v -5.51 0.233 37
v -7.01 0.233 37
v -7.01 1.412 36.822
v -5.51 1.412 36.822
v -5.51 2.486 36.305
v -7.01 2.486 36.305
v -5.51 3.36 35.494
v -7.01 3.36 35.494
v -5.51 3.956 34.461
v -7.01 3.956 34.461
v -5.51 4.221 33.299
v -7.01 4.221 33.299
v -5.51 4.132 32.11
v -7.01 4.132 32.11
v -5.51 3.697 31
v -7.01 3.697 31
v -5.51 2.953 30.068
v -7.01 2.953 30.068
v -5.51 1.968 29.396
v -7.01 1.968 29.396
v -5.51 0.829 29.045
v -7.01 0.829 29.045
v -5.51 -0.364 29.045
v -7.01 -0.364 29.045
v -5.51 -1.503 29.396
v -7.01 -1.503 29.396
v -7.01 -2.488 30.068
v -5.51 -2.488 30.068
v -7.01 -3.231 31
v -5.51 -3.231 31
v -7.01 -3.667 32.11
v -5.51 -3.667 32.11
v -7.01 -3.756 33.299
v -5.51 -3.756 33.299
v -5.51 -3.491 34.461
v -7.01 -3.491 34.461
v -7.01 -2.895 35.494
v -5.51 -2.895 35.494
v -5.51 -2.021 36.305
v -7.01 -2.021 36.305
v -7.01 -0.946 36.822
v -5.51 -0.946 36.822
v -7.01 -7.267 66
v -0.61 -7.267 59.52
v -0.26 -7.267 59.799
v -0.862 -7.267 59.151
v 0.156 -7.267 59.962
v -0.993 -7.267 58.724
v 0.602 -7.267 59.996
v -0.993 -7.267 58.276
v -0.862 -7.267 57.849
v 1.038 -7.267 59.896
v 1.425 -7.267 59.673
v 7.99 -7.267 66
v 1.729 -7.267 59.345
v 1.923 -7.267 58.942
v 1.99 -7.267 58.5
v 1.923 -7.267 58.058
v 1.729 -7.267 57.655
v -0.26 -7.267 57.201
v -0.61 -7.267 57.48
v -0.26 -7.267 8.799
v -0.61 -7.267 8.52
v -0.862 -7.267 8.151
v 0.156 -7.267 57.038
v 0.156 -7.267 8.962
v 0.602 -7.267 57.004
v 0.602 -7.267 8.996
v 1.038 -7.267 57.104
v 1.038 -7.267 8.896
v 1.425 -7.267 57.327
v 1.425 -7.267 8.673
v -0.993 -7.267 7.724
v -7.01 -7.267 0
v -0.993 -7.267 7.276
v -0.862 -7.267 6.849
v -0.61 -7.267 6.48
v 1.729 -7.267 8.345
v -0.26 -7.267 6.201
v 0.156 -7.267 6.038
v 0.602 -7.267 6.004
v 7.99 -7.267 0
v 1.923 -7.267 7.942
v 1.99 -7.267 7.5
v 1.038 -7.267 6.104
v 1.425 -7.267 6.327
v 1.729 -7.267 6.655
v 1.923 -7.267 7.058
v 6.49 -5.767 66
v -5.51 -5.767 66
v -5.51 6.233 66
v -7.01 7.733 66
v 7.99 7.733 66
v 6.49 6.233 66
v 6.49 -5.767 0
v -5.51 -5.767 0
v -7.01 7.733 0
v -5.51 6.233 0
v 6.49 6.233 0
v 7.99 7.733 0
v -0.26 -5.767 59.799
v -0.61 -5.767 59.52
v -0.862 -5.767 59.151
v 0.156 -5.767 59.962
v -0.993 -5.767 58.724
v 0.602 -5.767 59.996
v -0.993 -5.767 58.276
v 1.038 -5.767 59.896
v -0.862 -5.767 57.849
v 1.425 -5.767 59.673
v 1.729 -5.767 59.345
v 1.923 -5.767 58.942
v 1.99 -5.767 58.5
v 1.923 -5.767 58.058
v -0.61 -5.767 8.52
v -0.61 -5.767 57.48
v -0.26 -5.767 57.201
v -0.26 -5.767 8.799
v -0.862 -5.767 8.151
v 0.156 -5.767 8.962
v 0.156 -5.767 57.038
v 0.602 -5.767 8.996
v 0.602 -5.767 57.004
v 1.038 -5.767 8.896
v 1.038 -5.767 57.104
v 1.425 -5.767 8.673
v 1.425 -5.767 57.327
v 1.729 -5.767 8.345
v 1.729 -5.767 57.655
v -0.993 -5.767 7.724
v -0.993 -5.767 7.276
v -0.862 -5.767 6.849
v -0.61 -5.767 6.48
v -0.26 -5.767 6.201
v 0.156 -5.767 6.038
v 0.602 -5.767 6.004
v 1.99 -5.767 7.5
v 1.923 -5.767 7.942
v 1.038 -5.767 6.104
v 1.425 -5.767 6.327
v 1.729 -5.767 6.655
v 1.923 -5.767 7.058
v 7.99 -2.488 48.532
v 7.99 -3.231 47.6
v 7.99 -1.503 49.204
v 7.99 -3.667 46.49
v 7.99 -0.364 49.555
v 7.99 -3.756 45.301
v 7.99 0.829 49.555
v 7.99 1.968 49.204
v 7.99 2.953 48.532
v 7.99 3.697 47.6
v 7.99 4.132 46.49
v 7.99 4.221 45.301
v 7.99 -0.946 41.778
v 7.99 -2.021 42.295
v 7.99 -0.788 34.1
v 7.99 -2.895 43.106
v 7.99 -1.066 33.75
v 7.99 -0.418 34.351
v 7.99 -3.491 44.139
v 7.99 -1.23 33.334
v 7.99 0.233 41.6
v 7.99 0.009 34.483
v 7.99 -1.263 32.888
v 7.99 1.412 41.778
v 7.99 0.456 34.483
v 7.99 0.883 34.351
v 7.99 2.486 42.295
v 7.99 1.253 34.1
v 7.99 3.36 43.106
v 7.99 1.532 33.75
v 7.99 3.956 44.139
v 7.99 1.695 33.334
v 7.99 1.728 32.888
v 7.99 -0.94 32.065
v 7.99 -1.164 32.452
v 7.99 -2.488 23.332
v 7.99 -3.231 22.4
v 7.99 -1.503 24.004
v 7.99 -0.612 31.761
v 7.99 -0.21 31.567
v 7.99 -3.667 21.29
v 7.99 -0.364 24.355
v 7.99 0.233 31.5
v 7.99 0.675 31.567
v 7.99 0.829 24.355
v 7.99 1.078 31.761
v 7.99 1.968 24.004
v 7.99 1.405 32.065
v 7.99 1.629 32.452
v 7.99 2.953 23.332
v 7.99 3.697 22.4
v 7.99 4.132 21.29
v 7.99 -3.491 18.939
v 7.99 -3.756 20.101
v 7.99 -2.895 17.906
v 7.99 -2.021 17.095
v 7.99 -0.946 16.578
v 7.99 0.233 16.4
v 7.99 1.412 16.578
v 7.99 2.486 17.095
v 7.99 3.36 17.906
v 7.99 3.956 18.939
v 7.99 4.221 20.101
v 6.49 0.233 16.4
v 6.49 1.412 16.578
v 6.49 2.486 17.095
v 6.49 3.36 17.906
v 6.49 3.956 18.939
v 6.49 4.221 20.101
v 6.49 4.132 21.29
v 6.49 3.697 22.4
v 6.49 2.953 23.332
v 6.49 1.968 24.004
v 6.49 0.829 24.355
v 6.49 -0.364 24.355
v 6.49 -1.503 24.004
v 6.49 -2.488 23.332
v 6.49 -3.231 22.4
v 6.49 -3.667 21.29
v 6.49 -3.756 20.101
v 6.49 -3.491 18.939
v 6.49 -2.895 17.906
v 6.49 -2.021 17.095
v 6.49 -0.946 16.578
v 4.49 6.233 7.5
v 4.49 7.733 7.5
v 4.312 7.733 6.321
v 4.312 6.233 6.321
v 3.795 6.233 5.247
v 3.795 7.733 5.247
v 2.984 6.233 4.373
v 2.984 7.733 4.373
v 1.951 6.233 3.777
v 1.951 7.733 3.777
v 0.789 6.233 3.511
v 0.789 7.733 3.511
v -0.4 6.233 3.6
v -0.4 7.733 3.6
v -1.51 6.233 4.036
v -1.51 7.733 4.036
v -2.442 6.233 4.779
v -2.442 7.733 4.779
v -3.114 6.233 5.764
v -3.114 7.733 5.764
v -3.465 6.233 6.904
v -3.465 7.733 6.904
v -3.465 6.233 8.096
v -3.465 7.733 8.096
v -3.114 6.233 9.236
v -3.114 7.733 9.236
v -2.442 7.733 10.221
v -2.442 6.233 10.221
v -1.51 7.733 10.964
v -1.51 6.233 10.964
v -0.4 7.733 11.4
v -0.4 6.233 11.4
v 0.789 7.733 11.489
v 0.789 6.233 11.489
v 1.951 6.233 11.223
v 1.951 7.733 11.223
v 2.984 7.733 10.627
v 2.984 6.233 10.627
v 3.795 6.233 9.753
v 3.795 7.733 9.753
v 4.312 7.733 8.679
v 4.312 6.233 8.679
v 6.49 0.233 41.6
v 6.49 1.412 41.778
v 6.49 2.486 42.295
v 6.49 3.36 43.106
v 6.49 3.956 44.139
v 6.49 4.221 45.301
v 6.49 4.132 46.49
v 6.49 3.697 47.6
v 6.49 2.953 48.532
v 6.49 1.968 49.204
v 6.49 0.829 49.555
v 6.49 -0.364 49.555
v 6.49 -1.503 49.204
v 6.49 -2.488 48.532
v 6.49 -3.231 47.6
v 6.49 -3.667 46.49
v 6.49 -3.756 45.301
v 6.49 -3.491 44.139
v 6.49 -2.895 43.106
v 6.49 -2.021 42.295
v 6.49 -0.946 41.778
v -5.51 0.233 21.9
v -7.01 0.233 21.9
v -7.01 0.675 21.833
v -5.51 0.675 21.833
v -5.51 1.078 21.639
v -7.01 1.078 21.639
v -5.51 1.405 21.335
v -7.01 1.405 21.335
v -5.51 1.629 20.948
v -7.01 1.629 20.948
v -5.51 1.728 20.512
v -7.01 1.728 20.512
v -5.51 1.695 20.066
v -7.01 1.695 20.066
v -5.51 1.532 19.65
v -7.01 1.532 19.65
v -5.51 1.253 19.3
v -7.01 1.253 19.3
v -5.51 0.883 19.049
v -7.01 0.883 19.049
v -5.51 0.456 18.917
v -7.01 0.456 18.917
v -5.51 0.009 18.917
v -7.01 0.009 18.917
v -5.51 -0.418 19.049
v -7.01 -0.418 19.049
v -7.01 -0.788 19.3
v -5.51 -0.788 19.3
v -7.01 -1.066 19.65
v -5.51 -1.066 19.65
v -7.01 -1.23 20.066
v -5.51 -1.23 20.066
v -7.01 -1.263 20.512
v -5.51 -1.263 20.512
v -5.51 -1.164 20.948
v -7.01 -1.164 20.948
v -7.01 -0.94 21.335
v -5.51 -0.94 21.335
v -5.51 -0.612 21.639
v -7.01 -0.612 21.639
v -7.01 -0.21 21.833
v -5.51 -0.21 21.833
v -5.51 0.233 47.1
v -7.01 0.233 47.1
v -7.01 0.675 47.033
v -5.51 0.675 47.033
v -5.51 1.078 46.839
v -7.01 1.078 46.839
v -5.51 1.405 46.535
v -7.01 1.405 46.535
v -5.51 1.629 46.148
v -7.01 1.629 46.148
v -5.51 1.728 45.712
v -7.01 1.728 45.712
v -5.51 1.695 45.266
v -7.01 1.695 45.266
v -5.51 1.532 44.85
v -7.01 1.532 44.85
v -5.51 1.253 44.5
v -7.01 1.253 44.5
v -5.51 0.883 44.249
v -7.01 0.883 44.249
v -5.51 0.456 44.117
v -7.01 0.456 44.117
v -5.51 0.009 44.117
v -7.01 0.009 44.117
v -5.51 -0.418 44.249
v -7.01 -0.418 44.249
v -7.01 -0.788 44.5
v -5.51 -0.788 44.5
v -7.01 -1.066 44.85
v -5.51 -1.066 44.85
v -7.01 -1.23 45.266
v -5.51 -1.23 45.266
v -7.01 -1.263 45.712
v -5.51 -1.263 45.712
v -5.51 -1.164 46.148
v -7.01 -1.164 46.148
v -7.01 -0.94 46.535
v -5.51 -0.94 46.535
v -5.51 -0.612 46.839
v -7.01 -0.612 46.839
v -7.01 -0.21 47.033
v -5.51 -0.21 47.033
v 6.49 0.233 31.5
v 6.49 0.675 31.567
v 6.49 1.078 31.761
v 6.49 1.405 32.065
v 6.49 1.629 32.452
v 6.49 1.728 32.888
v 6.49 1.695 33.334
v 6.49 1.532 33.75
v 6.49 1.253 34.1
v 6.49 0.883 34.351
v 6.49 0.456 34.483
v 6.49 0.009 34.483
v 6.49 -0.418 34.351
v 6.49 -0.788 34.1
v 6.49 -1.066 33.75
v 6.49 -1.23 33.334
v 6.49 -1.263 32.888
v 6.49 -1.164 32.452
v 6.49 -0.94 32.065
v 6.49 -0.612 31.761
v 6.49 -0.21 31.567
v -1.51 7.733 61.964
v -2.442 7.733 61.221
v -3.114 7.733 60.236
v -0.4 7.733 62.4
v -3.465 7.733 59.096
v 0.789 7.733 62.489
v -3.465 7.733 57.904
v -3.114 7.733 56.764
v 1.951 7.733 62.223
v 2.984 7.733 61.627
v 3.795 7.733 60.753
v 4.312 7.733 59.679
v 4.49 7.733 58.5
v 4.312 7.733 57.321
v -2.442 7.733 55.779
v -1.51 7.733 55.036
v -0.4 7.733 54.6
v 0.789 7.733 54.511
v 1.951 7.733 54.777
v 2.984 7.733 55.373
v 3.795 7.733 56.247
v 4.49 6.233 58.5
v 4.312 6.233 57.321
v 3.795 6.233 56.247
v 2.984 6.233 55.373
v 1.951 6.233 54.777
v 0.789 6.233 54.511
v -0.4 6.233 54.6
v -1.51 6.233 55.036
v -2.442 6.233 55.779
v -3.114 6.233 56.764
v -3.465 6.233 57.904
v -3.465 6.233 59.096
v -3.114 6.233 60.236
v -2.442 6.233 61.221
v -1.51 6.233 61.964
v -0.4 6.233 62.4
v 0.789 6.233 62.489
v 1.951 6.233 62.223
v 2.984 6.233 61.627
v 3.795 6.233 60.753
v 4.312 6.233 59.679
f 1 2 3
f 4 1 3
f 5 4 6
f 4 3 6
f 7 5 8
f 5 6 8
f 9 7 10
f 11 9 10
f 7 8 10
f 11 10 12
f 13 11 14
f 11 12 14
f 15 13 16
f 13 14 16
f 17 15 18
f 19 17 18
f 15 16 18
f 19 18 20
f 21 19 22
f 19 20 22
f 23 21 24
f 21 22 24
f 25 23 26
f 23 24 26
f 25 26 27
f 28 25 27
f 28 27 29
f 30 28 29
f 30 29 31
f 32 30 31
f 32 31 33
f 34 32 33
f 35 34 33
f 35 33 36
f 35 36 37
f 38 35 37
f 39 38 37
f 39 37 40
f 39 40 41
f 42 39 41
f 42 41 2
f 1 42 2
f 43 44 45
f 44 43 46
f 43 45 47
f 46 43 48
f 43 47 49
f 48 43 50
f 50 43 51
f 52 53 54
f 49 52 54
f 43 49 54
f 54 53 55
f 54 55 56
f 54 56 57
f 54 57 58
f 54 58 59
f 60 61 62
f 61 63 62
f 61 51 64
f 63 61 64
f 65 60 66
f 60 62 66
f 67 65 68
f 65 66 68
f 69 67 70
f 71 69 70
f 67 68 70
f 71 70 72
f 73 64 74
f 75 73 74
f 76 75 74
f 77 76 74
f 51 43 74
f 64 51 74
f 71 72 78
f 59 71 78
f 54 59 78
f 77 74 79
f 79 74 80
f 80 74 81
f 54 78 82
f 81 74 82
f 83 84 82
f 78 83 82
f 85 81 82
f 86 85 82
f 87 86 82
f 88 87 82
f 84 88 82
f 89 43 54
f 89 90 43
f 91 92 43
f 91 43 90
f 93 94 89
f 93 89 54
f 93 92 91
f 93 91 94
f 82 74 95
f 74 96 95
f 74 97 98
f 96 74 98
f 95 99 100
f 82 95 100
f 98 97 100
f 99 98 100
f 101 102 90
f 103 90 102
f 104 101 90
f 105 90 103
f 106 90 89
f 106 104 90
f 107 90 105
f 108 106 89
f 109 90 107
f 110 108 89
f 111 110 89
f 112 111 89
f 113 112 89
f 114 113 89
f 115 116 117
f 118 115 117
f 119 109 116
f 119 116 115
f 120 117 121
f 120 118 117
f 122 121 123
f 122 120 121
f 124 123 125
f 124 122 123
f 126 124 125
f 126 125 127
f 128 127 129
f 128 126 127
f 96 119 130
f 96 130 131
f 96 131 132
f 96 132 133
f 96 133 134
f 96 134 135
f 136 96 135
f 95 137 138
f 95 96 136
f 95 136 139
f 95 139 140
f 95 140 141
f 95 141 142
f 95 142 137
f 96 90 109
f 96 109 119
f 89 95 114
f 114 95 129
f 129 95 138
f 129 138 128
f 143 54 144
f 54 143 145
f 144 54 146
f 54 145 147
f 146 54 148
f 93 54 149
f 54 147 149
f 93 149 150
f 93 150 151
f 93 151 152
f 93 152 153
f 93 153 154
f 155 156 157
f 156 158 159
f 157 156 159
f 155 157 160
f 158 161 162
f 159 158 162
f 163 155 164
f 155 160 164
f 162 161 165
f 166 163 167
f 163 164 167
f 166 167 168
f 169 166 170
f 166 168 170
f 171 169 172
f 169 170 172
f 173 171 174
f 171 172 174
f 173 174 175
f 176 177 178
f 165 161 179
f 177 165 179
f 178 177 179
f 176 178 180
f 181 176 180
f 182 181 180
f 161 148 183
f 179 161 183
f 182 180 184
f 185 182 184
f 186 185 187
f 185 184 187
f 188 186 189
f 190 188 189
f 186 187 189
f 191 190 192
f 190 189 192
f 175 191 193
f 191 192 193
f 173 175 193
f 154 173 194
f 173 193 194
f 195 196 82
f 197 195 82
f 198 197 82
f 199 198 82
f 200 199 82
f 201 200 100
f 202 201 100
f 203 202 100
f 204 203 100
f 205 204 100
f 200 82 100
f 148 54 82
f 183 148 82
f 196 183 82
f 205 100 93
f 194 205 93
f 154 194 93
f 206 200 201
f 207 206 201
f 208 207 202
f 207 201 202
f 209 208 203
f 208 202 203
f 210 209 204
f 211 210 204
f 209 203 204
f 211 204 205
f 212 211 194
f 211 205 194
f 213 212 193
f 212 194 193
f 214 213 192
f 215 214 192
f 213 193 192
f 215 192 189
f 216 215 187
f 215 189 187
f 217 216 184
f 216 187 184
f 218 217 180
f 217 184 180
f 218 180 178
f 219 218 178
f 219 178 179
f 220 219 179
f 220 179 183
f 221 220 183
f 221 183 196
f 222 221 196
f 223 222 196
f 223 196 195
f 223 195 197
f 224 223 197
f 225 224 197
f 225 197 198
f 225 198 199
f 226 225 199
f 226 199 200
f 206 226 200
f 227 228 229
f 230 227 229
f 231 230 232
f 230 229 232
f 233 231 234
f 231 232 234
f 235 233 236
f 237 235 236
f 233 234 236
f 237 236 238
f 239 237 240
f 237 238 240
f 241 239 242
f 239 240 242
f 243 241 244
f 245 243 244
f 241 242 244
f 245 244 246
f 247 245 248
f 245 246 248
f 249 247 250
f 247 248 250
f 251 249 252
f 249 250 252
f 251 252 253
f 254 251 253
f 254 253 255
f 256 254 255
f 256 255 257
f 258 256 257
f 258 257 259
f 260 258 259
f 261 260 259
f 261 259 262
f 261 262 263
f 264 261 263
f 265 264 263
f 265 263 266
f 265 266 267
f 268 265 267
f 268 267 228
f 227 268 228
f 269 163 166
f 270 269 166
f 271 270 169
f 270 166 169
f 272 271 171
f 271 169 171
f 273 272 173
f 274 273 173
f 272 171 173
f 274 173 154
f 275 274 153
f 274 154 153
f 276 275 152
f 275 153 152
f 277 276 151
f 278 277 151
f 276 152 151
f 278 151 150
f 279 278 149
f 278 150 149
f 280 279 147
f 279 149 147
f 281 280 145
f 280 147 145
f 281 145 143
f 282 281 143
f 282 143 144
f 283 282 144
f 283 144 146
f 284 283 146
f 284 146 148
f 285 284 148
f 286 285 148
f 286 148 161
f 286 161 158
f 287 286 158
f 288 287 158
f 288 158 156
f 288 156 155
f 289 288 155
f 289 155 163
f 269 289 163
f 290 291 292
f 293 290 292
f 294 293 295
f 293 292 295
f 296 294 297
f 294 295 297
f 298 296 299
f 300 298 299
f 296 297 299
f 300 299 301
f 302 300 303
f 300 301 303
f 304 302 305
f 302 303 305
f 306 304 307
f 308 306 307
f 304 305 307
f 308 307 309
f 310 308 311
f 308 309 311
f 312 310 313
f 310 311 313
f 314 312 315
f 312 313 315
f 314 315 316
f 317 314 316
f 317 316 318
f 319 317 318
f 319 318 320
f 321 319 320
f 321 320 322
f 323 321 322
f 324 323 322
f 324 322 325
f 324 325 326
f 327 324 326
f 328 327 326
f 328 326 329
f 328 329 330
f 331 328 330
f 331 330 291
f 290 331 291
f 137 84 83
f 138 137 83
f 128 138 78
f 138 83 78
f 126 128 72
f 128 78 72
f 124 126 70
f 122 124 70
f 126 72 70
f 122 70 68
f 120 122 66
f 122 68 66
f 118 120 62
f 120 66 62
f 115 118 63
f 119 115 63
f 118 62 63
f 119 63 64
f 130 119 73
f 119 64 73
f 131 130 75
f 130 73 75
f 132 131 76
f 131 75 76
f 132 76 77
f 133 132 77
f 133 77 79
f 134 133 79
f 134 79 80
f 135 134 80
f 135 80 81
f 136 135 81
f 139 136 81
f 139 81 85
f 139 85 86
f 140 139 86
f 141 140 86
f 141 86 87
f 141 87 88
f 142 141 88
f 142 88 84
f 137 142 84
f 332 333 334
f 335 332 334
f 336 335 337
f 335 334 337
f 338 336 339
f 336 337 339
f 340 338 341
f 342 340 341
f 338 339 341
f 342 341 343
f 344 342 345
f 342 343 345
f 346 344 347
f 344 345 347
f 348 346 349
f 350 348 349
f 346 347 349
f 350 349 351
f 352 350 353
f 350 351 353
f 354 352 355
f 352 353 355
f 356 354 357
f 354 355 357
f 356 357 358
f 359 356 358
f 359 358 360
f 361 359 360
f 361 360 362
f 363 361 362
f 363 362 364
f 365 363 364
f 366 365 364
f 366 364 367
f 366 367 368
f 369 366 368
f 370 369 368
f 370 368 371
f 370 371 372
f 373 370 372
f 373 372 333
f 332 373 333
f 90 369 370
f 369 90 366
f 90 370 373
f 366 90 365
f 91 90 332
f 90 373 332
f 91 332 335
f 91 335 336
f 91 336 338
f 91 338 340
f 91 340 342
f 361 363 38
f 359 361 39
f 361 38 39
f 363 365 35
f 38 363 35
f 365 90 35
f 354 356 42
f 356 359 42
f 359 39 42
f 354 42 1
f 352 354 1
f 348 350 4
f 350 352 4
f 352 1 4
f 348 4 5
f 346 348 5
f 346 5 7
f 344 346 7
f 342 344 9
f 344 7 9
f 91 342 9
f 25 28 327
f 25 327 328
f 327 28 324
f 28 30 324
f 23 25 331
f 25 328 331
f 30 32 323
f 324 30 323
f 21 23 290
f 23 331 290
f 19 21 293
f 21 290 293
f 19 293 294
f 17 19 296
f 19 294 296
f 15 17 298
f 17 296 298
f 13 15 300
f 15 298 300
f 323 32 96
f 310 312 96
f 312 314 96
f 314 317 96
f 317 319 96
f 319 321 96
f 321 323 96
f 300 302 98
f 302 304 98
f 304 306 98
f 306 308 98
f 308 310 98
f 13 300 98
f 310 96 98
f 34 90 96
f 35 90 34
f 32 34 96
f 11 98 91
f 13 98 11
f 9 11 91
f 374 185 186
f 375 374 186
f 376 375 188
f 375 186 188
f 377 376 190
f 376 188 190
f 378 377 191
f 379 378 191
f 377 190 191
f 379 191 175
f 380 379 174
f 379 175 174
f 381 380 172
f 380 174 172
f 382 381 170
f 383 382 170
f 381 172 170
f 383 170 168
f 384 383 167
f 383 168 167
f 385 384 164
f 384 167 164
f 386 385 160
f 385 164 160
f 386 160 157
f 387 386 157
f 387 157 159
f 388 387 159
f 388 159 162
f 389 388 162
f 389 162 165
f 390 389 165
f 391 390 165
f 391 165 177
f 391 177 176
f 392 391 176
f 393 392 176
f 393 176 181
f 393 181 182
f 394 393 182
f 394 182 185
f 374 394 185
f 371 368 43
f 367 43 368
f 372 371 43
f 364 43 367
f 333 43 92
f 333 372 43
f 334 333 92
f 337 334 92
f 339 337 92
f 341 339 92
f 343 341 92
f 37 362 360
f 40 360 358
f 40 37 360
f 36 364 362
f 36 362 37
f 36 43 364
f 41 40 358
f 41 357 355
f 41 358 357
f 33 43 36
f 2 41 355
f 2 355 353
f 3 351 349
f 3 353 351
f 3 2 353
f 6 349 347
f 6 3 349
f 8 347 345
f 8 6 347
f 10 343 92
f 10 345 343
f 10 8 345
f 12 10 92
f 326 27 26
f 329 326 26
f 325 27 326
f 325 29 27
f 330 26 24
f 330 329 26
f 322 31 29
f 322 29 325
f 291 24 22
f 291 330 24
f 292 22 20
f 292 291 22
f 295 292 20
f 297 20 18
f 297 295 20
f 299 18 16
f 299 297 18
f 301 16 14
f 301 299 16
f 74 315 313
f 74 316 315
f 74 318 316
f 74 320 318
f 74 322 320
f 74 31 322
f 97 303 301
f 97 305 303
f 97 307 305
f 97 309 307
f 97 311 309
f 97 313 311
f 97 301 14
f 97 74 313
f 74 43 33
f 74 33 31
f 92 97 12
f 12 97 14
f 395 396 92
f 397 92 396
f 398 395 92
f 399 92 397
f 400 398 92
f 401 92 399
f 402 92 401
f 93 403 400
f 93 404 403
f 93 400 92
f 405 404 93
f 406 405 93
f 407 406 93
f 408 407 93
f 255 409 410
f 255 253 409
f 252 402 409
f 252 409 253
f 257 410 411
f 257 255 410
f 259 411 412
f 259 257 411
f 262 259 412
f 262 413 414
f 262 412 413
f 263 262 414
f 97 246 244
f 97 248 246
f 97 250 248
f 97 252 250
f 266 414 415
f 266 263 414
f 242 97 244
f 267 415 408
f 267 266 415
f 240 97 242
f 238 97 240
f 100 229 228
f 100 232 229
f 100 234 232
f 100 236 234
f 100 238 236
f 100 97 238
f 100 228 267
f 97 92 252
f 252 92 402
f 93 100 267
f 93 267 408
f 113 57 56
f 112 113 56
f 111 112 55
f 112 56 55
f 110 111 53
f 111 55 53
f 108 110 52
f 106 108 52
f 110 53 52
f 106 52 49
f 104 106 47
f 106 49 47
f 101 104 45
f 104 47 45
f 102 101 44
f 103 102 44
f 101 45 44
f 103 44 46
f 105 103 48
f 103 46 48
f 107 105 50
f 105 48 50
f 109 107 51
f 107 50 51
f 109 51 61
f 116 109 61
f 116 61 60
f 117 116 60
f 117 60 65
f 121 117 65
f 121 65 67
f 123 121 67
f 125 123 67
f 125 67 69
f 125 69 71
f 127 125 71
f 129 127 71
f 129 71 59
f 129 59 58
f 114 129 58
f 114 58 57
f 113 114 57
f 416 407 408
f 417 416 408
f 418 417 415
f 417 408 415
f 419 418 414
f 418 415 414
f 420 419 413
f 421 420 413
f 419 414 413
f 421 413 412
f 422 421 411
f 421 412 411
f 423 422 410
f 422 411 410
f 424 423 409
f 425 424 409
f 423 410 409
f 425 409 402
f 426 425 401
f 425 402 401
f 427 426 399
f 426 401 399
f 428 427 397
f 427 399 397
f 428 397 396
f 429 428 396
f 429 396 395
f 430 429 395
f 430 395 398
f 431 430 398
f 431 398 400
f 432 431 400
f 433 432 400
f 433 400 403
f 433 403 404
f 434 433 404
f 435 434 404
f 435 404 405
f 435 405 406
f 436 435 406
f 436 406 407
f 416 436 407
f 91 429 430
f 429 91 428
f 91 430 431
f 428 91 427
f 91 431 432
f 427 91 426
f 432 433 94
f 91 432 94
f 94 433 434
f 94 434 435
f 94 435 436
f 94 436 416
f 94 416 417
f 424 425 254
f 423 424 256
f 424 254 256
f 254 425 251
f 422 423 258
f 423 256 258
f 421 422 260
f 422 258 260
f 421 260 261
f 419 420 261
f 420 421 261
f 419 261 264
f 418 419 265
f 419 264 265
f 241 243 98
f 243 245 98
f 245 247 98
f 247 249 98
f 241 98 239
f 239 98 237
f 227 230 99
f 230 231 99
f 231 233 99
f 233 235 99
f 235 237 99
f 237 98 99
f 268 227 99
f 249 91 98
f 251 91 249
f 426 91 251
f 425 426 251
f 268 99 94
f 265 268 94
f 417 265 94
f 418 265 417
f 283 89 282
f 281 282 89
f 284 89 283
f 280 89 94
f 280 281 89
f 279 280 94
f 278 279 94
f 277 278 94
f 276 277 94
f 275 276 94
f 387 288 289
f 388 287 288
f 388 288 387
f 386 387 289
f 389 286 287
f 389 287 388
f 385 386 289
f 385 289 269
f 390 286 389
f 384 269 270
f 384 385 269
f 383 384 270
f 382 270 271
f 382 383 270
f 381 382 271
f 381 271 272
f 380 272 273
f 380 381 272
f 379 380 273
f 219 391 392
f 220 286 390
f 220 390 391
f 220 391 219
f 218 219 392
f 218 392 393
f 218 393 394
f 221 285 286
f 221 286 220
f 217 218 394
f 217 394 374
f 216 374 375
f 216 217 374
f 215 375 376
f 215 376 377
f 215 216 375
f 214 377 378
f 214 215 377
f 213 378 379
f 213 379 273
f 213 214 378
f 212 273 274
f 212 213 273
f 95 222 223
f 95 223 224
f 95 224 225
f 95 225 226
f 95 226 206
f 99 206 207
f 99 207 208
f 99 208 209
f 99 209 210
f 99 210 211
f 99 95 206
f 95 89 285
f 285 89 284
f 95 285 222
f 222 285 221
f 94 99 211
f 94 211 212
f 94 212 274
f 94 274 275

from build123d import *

# Parameters (mm, degrees)
SKETCH_1_W          = 15
SKETCH_1_H          = 15
SKETCH_1_W_2        = 12
SKETCH_1_H_2        = 12
EXTRUDE_2_DEPTH     = 66
SKETCH_3_R          = 4
CUT_EXTRUDE_1_DEPTH = 10
SKETCH_4_R          = 4
CUT_EXTRUDE_2_DEPTH = 10
SKETCH_5_R          = 4
CUT_EXTRUDE_3_DEPTH = 10
SKETCH_6_R          = 1.5
CUT_EXTRUDE_4_DEPTH = 10
SKETCH_7_R          = 1.5
CUT_EXTRUDE_5_DEPTH = 10
SKETCH_8_R          = 1.5
CUT_EXTRUDE_6_DEPTH = 10
SKETCH_9_R          = 4
CUT_EXTRUDE_7_DEPTH = 10


with BuildPart() as part:
    # ｽｹｯﾁ1 → ﾎﾞｽ - 押し出し2 (new body)
    with BuildSketch(Plane.XY):
        with Locations((0.489915859, 0.232626086)):
            Rectangle(SKETCH_1_W, SKETCH_1_H)
        with Locations((0.489915859, 0.232626086)):
            Rectangle(SKETCH_1_W_2, SKETCH_1_H_2, mode=Mode.SUBTRACT)
    extrude(amount=EXTRUDE_2_DEPTH)

    # ｽｹｯﾁ3 → ｶｯﾄ - 押し出し1 (cut)
    with BuildSketch(Plane(origin=(0, 7.732626086, 0), x_dir=(1, 0, 0), z_dir=(0, 1, 0))):
        with Locations((0.489915859, -58.5)):
            Circle(SKETCH_3_R)
    extrude(amount=-CUT_EXTRUDE_1_DEPTH, mode=Mode.SUBTRACT)

    # ｽｹｯﾁ4 → ｶｯﾄ - 押し出し2 (cut)
    with BuildSketch(Plane(origin=(0, 7.732626086, 0), x_dir=(1, 0, 0), z_dir=(0, 1, 0))):
        with Locations((0.489915859, -7.5)):
            Circle(SKETCH_4_R)
    extrude(amount=-CUT_EXTRUDE_2_DEPTH, mode=Mode.SUBTRACT)

    # ｽｹｯﾁ5 → ｶｯﾄ - 押し出し3 (cut)
    with BuildSketch(Plane.ZY.offset(7.010084141)):
        with Locations((33, 0.232626086)):
            Circle(SKETCH_5_R)
    extrude(amount=-CUT_EXTRUDE_3_DEPTH, mode=Mode.SUBTRACT)

    # ｽｹｯﾁ6 → ｶｯﾄ - 押し出し4 (cut)
    with BuildSketch(Plane(origin=(7.989915859, 0, 0), x_dir=(0, 0, -1), z_dir=(1, 0, 0))):
        with Locations((-33, 0.232626086)):
            Circle(SKETCH_6_R)
    extrude(amount=-CUT_EXTRUDE_4_DEPTH, mode=Mode.SUBTRACT)

    # ｽｹｯﾁ7 → ｶｯﾄ - 押し出し5 (cut)
    with BuildSketch(Plane.XZ.offset(7.267373914)):
        with Locations((0.489915859, 58.5)):
            Circle(SKETCH_7_R)
        with Locations((0.489915859, 7.5)):
            Circle(SKETCH_7_R)
    extrude(amount=-CUT_EXTRUDE_5_DEPTH, mode=Mode.SUBTRACT)

    # ｽｹｯﾁ8 → ｶｯﾄ - 押し出し6 (cut)
    with BuildSketch(Plane.ZY.offset(7.010084141)):
        with Locations((45.6, 0.232626086)):
            Circle(SKETCH_8_R)
        with Locations((20.4, 0.232626086)):
            Circle(SKETCH_8_R)
    extrude(amount=-CUT_EXTRUDE_6_DEPTH, mode=Mode.SUBTRACT)

    # ｽｹｯﾁ9 → ｶｯﾄ - 押し出し7 (cut)
    with BuildSketch(Plane(origin=(7.989915859, 0, 0), x_dir=(0, 0, -1), z_dir=(1, 0, 0))):
        with Locations((-20.4, 0.232626086)):
            Circle(SKETCH_9_R)
        with Locations((-45.6, 0.232626086)):
            Circle(SKETCH_9_R)
    extrude(amount=-CUT_EXTRUDE_7_DEPTH, mode=Mode.SUBTRACT)


solid = part.part
